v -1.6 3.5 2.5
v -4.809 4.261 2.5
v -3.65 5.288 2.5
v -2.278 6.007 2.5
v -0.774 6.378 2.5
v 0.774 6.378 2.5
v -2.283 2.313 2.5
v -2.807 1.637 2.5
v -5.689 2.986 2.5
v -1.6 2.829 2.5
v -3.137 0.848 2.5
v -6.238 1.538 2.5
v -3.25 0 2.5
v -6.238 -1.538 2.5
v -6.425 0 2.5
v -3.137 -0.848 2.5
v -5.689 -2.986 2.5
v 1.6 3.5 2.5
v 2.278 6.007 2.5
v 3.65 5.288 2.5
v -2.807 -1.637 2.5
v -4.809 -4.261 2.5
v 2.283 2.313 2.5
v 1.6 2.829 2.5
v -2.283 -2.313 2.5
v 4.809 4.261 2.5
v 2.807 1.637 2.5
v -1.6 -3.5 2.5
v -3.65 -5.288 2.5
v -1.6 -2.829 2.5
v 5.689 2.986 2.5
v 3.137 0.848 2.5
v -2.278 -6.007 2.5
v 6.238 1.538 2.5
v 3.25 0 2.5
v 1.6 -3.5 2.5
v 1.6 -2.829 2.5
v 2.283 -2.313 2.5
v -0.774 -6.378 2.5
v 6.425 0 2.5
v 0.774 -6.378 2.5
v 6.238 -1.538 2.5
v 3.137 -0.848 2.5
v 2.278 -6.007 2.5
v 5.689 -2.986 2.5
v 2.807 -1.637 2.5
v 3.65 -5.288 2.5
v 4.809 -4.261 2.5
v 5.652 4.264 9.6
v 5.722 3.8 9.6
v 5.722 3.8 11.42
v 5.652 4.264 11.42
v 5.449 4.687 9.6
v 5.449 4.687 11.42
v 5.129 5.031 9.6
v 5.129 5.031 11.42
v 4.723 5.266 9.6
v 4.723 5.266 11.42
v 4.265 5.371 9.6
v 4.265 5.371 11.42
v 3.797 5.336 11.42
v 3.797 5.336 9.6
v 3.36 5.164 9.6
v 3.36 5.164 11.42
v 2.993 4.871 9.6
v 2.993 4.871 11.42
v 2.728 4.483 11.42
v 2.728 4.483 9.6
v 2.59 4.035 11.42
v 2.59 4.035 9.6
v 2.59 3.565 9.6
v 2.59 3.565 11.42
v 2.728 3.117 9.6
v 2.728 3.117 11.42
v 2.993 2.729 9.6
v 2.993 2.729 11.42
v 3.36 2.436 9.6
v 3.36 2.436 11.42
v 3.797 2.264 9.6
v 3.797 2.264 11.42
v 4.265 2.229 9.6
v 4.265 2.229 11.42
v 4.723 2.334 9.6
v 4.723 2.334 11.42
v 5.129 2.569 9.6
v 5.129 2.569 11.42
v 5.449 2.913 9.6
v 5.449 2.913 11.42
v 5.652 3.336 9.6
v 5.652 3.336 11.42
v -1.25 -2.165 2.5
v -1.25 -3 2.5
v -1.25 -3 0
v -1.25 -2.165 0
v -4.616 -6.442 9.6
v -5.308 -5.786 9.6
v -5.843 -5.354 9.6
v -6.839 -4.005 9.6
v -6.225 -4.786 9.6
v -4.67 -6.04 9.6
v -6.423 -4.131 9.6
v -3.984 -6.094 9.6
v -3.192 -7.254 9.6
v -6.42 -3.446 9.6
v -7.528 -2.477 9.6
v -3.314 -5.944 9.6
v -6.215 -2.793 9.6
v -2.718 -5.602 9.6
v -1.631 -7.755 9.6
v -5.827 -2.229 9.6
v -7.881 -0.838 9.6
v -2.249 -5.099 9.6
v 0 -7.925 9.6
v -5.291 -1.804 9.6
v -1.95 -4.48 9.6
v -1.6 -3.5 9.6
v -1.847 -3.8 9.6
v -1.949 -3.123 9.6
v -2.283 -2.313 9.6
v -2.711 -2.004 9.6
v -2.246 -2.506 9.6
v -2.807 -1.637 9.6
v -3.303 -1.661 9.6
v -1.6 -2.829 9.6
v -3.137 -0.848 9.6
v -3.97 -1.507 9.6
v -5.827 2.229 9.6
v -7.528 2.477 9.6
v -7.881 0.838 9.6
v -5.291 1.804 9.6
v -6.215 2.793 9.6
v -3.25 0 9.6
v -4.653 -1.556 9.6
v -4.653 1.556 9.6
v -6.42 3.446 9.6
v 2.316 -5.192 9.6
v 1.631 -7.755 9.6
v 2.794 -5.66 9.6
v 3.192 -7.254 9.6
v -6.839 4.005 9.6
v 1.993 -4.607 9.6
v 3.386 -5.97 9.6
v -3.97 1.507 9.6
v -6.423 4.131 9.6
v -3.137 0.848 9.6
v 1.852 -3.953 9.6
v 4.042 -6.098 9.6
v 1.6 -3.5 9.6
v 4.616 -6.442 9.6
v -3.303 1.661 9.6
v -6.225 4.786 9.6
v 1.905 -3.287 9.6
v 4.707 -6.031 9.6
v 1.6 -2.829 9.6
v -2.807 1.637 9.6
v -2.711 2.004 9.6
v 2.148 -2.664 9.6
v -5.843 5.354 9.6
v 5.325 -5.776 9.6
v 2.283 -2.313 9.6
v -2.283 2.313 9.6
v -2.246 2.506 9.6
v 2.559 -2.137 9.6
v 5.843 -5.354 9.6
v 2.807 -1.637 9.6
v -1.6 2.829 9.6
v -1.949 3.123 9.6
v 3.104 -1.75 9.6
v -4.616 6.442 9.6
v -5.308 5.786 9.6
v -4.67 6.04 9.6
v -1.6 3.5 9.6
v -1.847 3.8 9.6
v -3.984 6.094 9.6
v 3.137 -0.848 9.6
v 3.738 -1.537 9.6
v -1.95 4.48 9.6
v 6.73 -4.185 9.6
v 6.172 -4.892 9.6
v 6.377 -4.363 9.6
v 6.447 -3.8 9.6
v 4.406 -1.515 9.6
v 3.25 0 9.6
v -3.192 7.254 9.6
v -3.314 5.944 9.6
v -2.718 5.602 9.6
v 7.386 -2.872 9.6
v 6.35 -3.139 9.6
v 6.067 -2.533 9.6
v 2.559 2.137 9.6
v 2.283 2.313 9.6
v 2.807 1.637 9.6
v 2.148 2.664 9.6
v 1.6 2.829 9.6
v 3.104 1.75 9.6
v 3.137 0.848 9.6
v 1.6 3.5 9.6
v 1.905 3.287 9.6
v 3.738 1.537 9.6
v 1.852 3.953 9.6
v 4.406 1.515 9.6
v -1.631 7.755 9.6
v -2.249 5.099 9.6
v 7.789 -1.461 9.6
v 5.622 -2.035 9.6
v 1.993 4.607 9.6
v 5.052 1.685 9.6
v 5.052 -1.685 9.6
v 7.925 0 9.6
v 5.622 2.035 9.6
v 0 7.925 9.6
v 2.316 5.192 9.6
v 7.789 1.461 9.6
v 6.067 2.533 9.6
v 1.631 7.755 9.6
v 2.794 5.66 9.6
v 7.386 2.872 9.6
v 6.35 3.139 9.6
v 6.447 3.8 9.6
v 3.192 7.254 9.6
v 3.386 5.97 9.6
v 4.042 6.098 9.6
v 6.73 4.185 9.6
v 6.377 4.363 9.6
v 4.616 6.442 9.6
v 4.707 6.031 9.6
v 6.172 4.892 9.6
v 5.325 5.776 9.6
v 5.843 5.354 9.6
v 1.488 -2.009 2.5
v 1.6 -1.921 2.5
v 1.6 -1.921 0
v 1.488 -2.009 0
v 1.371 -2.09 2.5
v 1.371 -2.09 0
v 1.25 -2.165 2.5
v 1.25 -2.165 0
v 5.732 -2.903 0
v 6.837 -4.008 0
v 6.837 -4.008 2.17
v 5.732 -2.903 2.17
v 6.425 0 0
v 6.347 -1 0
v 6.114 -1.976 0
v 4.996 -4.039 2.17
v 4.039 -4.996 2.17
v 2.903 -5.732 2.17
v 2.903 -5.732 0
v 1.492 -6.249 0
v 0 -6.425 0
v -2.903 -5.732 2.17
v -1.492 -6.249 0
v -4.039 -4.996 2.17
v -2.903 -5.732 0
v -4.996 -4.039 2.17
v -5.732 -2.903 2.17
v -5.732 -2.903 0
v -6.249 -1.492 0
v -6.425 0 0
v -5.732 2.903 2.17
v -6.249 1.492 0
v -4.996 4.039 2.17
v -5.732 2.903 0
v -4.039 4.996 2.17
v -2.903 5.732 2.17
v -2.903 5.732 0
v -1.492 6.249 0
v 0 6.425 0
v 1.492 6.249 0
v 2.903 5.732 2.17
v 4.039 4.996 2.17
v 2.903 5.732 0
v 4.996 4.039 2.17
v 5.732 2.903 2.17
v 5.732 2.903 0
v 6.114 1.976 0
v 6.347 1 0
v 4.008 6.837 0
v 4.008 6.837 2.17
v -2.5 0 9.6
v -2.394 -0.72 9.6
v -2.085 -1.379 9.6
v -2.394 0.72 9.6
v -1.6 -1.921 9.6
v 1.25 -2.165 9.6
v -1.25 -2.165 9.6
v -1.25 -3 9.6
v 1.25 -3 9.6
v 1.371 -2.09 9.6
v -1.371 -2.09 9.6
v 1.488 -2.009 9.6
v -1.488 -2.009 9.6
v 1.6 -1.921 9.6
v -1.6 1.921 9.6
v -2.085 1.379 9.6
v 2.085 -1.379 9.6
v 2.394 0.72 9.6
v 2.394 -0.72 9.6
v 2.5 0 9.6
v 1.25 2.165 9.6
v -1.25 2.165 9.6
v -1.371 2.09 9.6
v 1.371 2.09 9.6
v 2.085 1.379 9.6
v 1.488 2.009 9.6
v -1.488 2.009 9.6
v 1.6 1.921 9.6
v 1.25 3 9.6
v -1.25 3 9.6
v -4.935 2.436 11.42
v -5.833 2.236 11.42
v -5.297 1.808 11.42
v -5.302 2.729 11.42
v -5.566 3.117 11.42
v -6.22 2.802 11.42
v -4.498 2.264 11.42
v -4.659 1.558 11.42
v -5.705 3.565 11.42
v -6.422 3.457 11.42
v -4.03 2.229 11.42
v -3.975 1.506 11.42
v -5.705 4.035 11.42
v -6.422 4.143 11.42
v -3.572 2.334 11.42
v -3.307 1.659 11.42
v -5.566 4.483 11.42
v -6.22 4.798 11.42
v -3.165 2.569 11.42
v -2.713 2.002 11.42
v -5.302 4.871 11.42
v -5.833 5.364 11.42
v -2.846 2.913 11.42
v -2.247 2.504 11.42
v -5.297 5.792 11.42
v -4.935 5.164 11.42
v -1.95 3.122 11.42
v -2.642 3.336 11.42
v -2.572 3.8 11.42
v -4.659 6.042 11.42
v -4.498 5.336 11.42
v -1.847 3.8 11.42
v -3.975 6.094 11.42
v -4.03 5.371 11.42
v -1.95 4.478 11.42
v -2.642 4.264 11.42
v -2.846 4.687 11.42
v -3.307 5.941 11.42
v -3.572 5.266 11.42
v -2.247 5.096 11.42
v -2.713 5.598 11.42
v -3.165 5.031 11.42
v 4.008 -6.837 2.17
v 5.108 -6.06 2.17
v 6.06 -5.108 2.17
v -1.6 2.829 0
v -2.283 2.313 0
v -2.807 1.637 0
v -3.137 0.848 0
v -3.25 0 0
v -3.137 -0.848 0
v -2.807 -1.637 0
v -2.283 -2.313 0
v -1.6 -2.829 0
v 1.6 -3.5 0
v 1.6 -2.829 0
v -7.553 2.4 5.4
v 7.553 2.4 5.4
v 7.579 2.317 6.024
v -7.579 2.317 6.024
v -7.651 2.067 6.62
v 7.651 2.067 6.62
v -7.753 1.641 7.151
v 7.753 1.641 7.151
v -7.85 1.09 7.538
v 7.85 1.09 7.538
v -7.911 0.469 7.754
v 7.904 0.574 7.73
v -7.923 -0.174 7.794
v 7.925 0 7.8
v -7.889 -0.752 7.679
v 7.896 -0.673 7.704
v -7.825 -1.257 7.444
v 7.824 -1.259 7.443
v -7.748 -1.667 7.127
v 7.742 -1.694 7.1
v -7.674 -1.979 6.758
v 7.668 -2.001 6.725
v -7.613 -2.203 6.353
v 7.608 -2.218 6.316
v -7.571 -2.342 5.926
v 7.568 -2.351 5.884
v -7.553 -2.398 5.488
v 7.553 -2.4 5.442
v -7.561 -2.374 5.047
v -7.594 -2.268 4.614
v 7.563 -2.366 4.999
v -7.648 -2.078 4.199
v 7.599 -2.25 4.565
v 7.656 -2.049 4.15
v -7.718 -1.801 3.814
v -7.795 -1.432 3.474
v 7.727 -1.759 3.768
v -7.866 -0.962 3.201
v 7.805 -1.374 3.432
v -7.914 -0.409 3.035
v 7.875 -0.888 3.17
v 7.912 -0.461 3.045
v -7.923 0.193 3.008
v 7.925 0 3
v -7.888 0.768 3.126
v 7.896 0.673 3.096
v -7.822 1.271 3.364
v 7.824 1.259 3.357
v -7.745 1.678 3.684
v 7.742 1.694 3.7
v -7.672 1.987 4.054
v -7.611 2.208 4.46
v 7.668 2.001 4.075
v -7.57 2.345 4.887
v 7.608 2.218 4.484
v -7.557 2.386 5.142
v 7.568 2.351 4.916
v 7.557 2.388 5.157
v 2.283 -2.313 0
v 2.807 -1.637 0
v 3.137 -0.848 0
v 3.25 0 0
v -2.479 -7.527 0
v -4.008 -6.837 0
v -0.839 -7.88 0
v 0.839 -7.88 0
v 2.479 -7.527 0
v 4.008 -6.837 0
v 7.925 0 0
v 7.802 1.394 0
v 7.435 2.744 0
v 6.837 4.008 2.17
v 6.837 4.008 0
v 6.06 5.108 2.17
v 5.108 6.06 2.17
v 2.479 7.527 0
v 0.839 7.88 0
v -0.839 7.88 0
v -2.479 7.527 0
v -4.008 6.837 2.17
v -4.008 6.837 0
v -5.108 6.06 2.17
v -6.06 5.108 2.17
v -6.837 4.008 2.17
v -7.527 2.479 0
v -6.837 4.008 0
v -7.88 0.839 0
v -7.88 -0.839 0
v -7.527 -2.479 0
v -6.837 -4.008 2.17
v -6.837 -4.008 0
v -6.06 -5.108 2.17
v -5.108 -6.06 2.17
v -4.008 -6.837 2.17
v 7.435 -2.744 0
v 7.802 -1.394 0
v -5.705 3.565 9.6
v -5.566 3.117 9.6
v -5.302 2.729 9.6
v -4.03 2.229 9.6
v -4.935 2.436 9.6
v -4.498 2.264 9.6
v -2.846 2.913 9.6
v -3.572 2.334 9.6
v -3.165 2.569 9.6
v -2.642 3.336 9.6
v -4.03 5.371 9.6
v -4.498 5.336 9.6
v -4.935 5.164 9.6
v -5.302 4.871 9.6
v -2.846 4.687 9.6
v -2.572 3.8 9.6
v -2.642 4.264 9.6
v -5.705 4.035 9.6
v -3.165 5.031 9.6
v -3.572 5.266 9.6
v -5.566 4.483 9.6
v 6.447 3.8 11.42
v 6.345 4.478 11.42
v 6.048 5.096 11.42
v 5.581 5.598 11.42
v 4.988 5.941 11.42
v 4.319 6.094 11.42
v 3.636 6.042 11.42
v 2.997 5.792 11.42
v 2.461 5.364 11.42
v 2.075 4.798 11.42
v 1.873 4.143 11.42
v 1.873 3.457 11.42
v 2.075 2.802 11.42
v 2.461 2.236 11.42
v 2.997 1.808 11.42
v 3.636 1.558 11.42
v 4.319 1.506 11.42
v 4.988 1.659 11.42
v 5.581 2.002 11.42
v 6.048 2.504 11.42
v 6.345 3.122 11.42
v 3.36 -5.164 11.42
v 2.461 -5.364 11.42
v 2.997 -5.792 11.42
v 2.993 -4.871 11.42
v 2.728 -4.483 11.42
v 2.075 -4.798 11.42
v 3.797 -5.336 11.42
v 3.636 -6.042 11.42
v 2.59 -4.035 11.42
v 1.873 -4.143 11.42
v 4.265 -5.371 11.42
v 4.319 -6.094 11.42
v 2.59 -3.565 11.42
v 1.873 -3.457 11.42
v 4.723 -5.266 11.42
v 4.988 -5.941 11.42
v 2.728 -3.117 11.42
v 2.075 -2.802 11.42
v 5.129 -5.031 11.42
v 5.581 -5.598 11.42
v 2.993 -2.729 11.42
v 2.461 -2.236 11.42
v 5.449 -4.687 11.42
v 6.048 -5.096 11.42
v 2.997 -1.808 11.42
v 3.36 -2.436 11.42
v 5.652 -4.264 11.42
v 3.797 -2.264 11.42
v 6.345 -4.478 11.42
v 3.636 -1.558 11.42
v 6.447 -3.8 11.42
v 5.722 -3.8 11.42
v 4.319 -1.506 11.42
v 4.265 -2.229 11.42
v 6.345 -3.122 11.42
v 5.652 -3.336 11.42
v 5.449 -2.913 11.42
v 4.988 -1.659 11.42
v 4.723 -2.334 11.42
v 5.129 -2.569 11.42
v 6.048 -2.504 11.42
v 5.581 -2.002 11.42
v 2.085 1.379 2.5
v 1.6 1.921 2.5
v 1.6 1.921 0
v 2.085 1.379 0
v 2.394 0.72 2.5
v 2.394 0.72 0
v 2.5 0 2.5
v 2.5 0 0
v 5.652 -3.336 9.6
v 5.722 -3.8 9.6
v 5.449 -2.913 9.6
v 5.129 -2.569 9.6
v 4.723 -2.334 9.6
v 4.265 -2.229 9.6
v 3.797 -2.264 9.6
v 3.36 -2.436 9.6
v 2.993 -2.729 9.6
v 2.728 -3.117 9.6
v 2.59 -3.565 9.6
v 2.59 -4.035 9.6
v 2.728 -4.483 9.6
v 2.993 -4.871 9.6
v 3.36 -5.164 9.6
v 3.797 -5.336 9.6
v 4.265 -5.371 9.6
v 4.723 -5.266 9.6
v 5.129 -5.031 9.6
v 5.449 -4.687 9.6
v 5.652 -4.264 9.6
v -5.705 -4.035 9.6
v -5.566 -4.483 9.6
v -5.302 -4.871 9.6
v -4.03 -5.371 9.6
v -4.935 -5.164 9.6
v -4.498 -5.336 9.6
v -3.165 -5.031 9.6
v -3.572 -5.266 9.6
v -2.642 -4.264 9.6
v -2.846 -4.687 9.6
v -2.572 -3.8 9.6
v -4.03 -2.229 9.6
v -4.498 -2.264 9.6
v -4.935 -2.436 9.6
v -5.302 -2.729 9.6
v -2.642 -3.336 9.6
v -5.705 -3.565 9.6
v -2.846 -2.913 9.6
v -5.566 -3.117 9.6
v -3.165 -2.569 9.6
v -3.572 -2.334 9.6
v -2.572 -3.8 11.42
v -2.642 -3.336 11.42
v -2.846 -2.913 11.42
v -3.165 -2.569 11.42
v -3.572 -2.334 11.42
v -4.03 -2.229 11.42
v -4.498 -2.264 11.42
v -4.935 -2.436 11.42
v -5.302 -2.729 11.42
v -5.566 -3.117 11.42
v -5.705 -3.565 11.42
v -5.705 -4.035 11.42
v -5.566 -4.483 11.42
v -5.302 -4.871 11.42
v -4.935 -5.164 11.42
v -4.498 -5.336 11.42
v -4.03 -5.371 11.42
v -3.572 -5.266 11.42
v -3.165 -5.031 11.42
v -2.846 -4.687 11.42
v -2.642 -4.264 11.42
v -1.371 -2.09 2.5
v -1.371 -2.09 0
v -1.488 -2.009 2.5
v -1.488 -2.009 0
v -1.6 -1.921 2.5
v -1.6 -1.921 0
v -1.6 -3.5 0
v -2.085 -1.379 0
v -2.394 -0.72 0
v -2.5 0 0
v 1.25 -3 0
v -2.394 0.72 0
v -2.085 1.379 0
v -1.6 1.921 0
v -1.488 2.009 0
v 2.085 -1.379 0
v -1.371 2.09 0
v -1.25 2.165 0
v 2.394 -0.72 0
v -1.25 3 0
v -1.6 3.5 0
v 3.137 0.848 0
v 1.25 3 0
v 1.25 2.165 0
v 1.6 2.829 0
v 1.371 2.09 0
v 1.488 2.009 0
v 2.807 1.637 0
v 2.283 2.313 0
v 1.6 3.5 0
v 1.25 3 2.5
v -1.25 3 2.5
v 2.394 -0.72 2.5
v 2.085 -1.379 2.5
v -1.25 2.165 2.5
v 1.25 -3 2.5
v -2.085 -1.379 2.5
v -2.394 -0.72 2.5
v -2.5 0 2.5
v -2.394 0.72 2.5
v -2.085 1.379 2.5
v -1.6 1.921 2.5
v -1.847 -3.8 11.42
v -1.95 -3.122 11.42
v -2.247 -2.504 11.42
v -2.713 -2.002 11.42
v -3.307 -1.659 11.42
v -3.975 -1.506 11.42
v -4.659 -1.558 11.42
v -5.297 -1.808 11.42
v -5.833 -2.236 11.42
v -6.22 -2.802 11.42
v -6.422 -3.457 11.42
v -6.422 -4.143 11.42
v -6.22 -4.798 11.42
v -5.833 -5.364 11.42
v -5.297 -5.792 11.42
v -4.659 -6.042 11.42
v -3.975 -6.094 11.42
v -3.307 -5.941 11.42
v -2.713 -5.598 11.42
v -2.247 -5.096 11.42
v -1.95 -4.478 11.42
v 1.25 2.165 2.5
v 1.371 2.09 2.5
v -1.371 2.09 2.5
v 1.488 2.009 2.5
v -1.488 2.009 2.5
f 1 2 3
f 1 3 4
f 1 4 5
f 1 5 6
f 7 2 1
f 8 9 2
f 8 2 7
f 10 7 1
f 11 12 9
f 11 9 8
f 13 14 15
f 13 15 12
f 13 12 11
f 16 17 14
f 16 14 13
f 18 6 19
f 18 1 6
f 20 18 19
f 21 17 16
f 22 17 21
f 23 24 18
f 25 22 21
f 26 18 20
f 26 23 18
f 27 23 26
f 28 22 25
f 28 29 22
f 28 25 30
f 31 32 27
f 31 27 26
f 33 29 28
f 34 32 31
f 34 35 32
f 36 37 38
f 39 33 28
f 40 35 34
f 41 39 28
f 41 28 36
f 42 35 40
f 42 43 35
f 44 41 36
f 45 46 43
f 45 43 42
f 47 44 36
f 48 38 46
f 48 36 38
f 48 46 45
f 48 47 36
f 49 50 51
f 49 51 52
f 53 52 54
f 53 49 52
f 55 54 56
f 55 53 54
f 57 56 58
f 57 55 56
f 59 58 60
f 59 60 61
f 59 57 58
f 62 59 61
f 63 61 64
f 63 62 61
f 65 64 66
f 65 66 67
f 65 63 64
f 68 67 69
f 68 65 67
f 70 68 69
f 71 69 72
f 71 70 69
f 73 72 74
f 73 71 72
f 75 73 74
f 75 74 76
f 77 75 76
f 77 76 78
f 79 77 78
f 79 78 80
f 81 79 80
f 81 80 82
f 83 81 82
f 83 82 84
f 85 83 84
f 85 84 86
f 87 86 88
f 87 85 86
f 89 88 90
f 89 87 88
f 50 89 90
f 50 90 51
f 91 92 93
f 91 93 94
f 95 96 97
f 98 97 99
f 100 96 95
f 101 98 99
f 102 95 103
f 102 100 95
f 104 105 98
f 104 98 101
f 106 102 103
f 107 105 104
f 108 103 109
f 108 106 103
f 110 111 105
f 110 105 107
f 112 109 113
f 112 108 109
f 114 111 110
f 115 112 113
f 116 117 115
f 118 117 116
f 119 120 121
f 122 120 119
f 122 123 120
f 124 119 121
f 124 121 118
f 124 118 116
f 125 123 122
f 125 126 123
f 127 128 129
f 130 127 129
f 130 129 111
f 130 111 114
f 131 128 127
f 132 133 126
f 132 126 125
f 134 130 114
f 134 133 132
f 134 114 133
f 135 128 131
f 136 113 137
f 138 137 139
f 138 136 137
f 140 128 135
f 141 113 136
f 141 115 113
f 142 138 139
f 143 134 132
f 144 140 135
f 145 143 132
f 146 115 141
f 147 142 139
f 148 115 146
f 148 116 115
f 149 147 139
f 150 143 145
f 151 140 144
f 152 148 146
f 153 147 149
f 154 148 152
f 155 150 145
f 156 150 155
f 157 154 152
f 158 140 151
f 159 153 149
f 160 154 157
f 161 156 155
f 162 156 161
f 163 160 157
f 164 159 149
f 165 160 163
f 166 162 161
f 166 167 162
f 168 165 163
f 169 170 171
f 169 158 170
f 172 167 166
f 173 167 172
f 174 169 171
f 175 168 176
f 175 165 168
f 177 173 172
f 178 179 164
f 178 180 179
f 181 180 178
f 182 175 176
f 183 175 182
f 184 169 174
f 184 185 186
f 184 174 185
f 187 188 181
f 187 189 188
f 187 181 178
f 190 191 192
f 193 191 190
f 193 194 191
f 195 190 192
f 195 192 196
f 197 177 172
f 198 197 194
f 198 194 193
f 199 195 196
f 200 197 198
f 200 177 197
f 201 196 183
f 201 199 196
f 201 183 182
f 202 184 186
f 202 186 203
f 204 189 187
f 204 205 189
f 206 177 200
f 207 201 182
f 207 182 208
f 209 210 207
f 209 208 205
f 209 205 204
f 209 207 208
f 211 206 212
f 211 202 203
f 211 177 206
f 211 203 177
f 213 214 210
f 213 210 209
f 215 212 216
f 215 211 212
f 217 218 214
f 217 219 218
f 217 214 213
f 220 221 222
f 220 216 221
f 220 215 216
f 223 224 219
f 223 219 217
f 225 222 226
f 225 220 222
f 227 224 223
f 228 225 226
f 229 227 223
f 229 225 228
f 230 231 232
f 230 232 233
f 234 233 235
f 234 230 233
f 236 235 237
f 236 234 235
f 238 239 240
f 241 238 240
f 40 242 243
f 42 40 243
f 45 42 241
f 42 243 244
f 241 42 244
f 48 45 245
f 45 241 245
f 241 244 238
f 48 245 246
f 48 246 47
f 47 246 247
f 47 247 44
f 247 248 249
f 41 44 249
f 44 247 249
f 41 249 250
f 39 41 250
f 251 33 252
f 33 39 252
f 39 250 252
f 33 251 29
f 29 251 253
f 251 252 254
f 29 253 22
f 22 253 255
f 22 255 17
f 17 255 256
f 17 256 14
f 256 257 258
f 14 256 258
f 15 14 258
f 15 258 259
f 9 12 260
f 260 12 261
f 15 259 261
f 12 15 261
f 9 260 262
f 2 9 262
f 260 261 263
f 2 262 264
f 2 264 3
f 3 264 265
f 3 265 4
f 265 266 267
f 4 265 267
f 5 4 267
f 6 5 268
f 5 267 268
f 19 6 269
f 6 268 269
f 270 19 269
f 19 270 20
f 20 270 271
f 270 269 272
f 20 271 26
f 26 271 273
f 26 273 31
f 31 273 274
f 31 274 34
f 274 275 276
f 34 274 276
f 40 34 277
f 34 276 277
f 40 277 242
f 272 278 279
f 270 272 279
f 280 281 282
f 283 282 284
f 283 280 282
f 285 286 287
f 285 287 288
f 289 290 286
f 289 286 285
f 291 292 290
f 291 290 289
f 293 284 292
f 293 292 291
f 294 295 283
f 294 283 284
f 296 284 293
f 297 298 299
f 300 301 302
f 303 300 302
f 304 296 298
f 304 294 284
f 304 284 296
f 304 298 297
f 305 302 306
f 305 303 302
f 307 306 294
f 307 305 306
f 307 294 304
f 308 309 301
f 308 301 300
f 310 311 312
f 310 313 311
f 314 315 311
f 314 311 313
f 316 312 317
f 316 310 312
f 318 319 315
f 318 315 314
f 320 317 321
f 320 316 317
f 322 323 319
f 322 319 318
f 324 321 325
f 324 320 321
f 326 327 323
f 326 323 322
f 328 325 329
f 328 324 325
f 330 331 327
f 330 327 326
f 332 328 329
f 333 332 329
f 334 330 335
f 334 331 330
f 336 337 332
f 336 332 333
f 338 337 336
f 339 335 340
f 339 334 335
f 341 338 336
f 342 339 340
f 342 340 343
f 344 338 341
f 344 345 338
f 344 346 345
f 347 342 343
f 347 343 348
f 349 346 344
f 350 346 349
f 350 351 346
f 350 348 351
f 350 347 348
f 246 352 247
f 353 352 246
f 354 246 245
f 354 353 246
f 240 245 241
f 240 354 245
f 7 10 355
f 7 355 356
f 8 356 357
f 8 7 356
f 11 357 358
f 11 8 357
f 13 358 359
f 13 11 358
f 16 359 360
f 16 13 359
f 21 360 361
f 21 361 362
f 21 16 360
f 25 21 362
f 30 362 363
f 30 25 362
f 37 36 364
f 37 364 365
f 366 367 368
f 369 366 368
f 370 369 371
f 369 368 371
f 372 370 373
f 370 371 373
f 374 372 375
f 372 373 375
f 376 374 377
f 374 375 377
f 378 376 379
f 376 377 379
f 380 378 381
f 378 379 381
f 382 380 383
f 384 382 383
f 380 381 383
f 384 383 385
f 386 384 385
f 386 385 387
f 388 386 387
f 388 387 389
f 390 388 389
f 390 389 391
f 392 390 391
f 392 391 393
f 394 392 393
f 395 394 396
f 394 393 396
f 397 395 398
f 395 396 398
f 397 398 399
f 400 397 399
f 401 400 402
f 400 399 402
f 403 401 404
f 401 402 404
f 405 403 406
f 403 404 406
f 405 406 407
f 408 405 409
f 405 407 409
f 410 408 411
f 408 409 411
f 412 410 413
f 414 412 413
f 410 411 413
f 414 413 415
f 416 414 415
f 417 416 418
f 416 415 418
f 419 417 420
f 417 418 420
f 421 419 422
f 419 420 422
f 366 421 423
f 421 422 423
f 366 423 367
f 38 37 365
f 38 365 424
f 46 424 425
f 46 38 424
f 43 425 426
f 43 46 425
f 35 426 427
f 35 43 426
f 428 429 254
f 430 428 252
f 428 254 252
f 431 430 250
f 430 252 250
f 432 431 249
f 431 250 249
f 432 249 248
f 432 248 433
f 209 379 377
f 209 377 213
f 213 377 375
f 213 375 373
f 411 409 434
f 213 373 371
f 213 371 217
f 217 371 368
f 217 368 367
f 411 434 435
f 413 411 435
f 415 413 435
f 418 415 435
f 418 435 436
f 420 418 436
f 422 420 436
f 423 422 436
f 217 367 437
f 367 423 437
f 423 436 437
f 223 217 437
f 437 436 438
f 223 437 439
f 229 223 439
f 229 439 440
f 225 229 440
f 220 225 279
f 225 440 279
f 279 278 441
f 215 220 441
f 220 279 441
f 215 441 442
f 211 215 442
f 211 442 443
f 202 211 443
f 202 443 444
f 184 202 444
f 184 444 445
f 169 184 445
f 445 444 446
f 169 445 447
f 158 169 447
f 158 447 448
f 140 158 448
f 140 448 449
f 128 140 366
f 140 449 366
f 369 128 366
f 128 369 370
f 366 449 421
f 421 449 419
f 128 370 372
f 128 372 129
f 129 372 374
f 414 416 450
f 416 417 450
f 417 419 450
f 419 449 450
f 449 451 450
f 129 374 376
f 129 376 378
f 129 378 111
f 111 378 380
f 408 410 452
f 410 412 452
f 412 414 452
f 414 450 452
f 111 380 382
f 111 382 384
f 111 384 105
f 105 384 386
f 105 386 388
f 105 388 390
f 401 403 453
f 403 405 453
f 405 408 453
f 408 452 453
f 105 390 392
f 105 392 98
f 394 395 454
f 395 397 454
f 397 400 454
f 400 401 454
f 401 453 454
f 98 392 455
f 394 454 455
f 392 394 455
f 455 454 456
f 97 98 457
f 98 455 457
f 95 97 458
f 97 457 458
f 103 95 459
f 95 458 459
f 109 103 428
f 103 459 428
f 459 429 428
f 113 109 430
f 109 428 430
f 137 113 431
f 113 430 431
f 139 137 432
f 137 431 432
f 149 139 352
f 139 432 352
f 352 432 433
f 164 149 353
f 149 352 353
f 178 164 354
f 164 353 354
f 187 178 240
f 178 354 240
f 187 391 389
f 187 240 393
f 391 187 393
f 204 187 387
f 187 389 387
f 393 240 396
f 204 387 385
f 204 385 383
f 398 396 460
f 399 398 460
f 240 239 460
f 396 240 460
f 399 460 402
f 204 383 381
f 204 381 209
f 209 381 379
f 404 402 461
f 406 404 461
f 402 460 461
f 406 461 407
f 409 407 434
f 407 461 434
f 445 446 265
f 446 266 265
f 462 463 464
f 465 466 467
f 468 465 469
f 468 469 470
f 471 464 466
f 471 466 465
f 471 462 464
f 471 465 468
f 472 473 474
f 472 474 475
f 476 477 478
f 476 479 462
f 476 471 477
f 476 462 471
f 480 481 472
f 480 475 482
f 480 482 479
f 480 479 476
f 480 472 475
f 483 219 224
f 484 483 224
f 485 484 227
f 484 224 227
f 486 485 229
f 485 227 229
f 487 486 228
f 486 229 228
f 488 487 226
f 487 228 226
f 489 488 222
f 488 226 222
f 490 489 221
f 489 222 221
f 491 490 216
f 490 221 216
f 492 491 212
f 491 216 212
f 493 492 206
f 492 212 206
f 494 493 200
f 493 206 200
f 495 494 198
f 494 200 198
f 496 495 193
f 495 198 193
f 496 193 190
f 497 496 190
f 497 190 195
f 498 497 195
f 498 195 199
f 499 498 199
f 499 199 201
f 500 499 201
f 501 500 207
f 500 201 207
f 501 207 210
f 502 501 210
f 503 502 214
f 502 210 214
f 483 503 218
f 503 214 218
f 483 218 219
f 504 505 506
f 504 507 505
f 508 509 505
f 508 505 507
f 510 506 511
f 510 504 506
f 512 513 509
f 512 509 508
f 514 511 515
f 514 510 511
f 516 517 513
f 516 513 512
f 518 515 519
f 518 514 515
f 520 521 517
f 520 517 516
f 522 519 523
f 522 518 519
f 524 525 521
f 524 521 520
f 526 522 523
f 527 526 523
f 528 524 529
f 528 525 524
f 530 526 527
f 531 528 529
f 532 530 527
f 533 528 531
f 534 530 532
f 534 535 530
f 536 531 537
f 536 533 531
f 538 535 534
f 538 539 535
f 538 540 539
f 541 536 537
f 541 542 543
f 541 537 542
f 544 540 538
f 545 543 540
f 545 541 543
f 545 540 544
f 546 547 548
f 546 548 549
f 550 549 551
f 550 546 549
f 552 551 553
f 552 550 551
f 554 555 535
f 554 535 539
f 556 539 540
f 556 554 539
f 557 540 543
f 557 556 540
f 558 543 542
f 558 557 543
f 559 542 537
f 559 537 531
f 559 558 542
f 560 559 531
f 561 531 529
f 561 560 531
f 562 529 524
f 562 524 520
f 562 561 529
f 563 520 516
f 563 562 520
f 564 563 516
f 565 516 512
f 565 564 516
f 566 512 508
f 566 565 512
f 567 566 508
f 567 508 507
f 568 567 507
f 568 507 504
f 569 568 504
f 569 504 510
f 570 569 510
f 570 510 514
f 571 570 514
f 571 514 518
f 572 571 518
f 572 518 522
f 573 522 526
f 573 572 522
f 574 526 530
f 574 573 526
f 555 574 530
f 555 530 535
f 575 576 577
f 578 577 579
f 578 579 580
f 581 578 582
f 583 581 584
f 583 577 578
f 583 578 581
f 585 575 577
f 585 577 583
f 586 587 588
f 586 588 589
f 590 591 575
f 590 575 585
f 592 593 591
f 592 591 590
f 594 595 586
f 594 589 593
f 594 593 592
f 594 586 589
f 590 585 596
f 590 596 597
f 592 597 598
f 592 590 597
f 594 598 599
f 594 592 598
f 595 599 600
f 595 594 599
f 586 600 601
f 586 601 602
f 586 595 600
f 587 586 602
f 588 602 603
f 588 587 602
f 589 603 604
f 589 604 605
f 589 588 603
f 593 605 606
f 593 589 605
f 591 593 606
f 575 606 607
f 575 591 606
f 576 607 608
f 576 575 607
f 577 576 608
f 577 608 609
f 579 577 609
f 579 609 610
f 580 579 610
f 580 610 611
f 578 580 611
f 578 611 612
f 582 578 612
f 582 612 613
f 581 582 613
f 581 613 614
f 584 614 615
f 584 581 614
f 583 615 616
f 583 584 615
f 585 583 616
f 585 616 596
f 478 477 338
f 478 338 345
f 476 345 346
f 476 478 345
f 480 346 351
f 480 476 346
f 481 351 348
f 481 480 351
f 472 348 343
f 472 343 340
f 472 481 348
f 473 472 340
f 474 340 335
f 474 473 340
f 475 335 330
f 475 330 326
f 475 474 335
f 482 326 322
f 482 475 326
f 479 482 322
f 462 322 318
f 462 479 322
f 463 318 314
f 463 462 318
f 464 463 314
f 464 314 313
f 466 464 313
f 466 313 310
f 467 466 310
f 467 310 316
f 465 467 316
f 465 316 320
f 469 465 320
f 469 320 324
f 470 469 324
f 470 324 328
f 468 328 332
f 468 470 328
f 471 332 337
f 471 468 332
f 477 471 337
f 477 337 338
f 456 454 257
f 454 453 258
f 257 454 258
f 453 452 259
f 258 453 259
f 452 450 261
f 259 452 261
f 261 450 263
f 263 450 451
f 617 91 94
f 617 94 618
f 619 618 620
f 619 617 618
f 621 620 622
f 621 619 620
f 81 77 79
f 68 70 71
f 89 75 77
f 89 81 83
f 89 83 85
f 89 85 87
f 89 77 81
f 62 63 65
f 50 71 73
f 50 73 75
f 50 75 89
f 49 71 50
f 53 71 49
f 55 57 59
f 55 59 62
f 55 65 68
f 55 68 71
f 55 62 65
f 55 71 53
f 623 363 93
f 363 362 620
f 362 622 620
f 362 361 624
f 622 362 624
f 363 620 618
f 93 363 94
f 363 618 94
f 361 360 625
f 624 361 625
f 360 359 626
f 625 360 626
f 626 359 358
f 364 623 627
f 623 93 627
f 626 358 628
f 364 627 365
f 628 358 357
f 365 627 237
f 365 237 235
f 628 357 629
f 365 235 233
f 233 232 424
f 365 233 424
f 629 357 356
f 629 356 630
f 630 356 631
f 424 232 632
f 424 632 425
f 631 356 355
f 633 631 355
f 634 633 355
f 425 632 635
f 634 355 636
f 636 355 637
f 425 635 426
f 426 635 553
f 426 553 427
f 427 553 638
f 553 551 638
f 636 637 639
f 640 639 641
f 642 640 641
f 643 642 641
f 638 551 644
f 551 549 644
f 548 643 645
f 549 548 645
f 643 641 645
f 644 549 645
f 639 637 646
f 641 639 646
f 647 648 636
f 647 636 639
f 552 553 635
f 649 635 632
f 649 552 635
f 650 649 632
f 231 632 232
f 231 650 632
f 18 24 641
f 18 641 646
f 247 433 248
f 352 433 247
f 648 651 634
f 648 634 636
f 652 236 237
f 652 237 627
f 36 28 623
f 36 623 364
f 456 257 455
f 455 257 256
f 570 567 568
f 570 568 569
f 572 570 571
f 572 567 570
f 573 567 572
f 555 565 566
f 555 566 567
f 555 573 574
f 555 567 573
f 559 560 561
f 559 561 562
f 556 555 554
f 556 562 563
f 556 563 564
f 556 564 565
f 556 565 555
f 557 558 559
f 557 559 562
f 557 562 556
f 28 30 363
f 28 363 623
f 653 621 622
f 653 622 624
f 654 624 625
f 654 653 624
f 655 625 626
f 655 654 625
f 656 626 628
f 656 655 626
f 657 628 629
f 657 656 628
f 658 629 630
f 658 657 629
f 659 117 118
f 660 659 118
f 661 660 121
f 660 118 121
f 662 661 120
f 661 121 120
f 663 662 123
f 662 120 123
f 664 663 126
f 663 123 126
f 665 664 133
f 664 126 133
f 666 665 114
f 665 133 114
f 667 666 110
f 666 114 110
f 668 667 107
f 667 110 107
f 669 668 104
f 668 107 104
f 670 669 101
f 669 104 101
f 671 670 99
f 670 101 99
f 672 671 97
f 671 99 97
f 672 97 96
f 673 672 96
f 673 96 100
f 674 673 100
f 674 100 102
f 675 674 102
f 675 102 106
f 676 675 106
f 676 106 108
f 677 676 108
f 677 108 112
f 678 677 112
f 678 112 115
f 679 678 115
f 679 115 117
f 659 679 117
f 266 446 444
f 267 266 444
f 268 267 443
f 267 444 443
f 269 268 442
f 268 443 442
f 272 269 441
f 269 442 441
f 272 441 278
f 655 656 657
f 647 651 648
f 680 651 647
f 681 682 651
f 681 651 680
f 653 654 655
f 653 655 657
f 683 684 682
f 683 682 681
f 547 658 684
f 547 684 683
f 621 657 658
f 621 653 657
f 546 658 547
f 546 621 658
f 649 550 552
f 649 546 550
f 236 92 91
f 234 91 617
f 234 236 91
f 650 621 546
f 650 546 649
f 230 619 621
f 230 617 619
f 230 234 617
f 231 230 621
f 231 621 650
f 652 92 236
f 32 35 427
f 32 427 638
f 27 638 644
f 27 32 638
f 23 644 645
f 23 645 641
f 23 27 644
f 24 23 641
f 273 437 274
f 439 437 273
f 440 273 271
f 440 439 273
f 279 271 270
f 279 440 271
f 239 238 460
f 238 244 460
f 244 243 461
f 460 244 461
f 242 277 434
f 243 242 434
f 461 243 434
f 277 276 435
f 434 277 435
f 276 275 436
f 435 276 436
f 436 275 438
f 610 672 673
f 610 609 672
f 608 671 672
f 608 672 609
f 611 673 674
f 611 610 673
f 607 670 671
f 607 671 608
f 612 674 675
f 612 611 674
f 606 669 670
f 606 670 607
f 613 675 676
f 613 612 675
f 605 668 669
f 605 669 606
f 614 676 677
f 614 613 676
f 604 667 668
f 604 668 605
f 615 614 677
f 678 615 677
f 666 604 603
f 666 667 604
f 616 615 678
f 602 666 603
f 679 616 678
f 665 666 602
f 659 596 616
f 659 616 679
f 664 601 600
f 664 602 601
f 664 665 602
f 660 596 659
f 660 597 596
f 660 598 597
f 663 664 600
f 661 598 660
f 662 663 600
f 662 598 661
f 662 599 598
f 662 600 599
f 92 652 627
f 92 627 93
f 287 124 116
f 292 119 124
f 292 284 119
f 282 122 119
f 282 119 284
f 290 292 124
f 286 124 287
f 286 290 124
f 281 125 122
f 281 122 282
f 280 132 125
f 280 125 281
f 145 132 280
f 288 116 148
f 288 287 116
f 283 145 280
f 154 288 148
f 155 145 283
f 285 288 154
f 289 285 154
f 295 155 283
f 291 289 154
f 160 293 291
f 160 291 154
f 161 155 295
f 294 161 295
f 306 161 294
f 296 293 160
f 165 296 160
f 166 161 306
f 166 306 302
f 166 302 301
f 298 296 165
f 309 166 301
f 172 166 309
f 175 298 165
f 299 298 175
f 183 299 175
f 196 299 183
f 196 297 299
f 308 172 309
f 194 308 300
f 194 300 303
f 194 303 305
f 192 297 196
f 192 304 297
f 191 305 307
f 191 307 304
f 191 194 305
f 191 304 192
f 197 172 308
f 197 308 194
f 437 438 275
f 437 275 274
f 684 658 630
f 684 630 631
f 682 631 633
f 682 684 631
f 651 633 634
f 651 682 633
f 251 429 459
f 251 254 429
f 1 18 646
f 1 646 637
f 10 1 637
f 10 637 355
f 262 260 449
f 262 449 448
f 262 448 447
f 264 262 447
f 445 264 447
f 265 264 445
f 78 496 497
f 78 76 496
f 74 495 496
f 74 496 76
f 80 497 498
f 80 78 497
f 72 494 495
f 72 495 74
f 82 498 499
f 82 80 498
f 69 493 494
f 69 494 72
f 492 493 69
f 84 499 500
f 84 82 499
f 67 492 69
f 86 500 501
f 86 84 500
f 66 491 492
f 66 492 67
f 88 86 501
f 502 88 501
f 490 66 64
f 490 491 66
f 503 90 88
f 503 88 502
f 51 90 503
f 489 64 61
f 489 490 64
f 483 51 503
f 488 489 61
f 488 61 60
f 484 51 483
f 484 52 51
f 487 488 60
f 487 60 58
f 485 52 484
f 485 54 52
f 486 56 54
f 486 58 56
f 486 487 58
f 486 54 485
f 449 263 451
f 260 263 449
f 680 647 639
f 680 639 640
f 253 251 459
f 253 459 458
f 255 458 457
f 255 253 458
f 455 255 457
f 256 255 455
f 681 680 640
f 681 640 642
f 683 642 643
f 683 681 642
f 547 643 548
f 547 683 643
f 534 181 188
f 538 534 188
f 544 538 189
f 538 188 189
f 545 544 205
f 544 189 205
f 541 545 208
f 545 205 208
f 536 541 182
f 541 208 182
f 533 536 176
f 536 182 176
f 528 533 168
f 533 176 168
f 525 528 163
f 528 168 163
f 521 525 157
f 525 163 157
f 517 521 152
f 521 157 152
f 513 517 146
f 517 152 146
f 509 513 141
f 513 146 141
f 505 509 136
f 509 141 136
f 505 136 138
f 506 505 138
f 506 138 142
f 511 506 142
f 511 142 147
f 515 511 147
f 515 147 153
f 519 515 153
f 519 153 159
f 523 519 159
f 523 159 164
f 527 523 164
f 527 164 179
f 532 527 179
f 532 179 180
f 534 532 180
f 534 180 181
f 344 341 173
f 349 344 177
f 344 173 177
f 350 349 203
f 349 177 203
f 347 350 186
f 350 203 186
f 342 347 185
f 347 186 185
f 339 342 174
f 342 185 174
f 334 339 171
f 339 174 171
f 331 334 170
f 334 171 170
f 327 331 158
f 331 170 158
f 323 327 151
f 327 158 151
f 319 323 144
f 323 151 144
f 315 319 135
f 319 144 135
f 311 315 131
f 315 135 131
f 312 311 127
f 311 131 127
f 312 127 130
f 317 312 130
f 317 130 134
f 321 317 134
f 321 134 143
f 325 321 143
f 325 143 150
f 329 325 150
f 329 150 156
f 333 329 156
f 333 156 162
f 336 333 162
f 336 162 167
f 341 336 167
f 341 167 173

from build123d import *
from build123d import SkipClean  # not in build123d's __all__

# Parameters (mm, degrees)
F0_R      = 7.925
F1_DEPTH  = 9.6
F2_R      = 6.425
F3_DEPTH  = 2.5
F4_R      = 2.3
F4_R_2    = 1.575
F5_DEPTH  = 1.82
F12_W     = 4
F12_H     = 4.34
F13_DEPTH = 22.4162849636
F10_W     = 4
F10_H     = 4.34
F14_DEPTH = 22.4162849636
F17_DEPTH = 9.6
F15_R     = 2.4
F18_DEPTH = 15.851


with BuildPart() as f1:
    # F0 (on Top) → F1 (new body)
    with BuildSketch(Plane.XY):
        Circle(F0_R)
    extrude(amount=F1_DEPTH)

    # F2 (on face) → F3 (cut)
    with BuildSketch(Plane(origin=(0, 0, 0), x_dir=(1, 0, 0), z_dir=(0, 0, -1))):
        Circle(F2_R)
    extrude(amount=-F3_DEPTH, mode=Mode.SUBTRACT)

    # F4 (on face) → F5 (join)
    with BuildSketch(Plane.XY.offset(9.6)):
        with Locations((-4.1473636204, -3.8)):
            Circle(F4_R)
        with Locations((-4.1473636204, -3.8)):
            Circle(F4_R_2, mode=Mode.SUBTRACT)
        with Locations((-4.1473636204, 3.8)):
            Circle(F4_R)
        with Locations((-4.1473636204, 3.8)):
            Circle(F4_R_2, mode=Mode.SUBTRACT)
        with Locations((4.1473636204, 3.8)):
            Circle(F4_R)
        with Locations((4.1473636204, 3.8)):
            Circle(F4_R_2, mode=Mode.SUBTRACT)
        with Locations((4.1473636204, -3.8)):
            Circle(F4_R)
        with Locations((4.1473636204, -3.8)):
            Circle(F4_R_2, mode=Mode.SUBTRACT)
    extrude(amount=F5_DEPTH)

    # F12 (on face) → F13 (cut, through all)
    with BuildSketch(Plane(origin=(7.925, 7.925, 0), x_dir=(-0.7071067812, 0.7071067812, 0), z_dir=(0.7071067812, 0.7071067812, 0))):
        Rectangle(F12_W, F12_H)
    extrude(amount=-F13_DEPTH, mode=Mode.SUBTRACT)

    # F10 (on face) → F14 (cut, through all)
    with BuildSketch(Plane(origin=(7.925, -7.925, 0), x_dir=(0.7071067812, 0.7071067812, 0), z_dir=(0.7071067812, -0.7071067812, 0))):
        Rectangle(F10_W, F10_H)
    extrude(amount=-F14_DEPTH, mode=Mode.SUBTRACT)

    # F16 (on face) → F17 (join)
    with BuildSketch(Plane.XY.offset(9.6)):
        with BuildLine():
            Line((1.6, 2.828869032), (1.6, 3.5))
            Line((1.6, 3.5), (-1.6, 3.5))
            Line((-1.6, 3.5), (-1.6, 2.828869032))
            ThreePointArc((-1.6, 2.828869032), (-1.4275666191, 2.9196838096), (-1.25, 3))
            ThreePointArc((-1.25, 3), (0, 3.25), (1.25, 3))
            ThreePointArc((1.25, 3), (1.4275666191, 2.9196838096), (1.6, 2.828869032))
        make_face()
        with BuildLine():
            ThreePointArc((3.25, 0), (2.8073564077, 1.6374522894), (1.6, 2.828869032))
            Line((1.6, 2.828869032), (1.6, 1.9209372712))
            ThreePointArc((1.6, 1.9209372712), (2.2638462845, 1.0606601718), (2.5, 0))
            ThreePointArc((2.5, 0), (2.2638462845, -1.0606601718), (1.6, -1.9209372712))
            Line((1.6, -1.9209372712), (1.6, -2.828869032))
            ThreePointArc((1.6, -2.828869032), (2.8073564077, -1.6374522894), (3.25, 0))
        make_face()
        with BuildLine():
            Line((1.6, 1.9209372712), (1.6, 2.828869032))
            ThreePointArc((1.6, 2.828869032), (1.4275666191, 2.9196838096), (1.25, 3))
            Line((1.25, 3), (1.25, 2.1650635095))
            ThreePointArc((1.25, 2.1650635095), (1.4302183068, 2.0504817958), (1.6, 1.9209372712))
        make_face()
        with BuildLine():
            ThreePointArc((-1.25, 3), (-1.4275666191, 2.9196838096), (-1.6, 2.828869032))
            Line((-1.6, 2.828869032), (-1.6, 1.9209372712))
            ThreePointArc((-1.6, 1.9209372712), (-1.4302183068, 2.0504817958), (-1.25, 2.1650635095))
            Line((-1.25, 2.1650635095), (-1.25, 3))
        make_face()
        with BuildLine():
            Line((-1.6, 1.9209372712), (-1.6, 2.828869032))
            ThreePointArc((-1.6, 2.828869032), (-3.25, 0), (-1.6, -2.828869032))
            Line((-1.6, -2.828869032), (-1.6, -1.9209372712))
            ThreePointArc((-1.6, -1.9209372712), (-2.5, 0), (-1.6, 1.9209372712))
        make_face()
        with BuildLine():
            ThreePointArc((-1.25, -3), (-1.4275666191, -2.9196838096), (-1.6, -2.828869032))
            Line((-1.6, -2.828869032), (-1.6, -3.5))
            Line((-1.6, -3.5), (1.6, -3.5))
            Line((1.6, -3.5), (1.6, -2.828869032))
            ThreePointArc((1.6, -2.828869032), (1.4275666191, -2.9196838096), (1.25, -3))
            ThreePointArc((1.25, -3), (0, -3.25), (-1.25, -3))
        make_face()
        with BuildLine():
            Line((-1.6, -1.9209372712), (-1.6, -2.828869032))
            ThreePointArc((-1.6, -2.828869032), (-1.4275666191, -2.9196838096), (-1.25, -3))
            Line((-1.25, -3), (-1.25, -2.1650635095))
            ThreePointArc((-1.25, -2.1650635095), (-1.4302183068, -2.0504817958), (-1.6, -1.9209372712))
        make_face()
        with BuildLine():
            Line((1.6, -2.828869032), (1.6, -1.9209372712))
            ThreePointArc((1.6, -1.9209372712), (1.4302183068, -2.0504817958), (1.25, -2.1650635095))
            Line((1.25, -2.1650635095), (1.25, -3))
            ThreePointArc((1.25, -3), (1.4275666191, -2.9196838096), (1.6, -2.828869032))
        make_face()
        with BuildLine():
            Line((-1.25, 3), (1.25, 3))
            ThreePointArc((1.25, 3), (0, 3.25), (-1.25, 3))
        make_face()
        with BuildLine():
            Line((1.25, -3), (-1.25, -3))
            ThreePointArc((-1.25, -3), (0, -3.25), (1.25, -3))
        make_face()
    with SkipClean():  # cleaning this boolean's faces spoils the solid; the shape is the same uncleaned
        extrude(amount=-F17_DEPTH)

    # F15 (on offset) → F18 (cut, through all)
    with BuildSketch(Plane.YZ.offset(7.925)):
        with Locations((0, 5.4)):
            Circle(F15_R)
    with SkipClean():  # cleaning this boolean's faces spoils the solid; the shape is the same uncleaned
        extrude(amount=-F18_DEPTH, mode=Mode.SUBTRACT)


solid = f1.part
